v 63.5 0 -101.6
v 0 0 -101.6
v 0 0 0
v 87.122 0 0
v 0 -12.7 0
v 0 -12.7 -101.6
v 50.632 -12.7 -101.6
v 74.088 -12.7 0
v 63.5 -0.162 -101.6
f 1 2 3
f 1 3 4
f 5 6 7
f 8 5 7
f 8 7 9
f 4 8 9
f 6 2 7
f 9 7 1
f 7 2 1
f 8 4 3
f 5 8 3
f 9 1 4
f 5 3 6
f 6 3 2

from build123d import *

# Parameters (mm, degrees)
F1_DEPTH = 12.7
F4_DEPTH = 118.595184


with BuildPart() as f1:
    # F0 (on Front) → F1 (new body)
    with BuildSketch(Plane.XZ):
        Polygon((87.122, 0), (0, 0), (0, -101.6), (63.5, -101.6), align=None)
    extrude(amount=F1_DEPTH)

    # F3 (on face) → F4 (cut, through all)
    with BuildSketch(Plane(origin=(4.408633, 0, 19.095886), x_dir=(0.97437, 0, -0.224951), z_dir=(-0.224951, 0, -0.97437))):
        Polygon((84.889069, 12.7), (72.189069, 12.7), (84.889069, 0), align=None)
    extrude(amount=F4_DEPTH, mode=Mode.SUBTRACT)


solid = f1.part
